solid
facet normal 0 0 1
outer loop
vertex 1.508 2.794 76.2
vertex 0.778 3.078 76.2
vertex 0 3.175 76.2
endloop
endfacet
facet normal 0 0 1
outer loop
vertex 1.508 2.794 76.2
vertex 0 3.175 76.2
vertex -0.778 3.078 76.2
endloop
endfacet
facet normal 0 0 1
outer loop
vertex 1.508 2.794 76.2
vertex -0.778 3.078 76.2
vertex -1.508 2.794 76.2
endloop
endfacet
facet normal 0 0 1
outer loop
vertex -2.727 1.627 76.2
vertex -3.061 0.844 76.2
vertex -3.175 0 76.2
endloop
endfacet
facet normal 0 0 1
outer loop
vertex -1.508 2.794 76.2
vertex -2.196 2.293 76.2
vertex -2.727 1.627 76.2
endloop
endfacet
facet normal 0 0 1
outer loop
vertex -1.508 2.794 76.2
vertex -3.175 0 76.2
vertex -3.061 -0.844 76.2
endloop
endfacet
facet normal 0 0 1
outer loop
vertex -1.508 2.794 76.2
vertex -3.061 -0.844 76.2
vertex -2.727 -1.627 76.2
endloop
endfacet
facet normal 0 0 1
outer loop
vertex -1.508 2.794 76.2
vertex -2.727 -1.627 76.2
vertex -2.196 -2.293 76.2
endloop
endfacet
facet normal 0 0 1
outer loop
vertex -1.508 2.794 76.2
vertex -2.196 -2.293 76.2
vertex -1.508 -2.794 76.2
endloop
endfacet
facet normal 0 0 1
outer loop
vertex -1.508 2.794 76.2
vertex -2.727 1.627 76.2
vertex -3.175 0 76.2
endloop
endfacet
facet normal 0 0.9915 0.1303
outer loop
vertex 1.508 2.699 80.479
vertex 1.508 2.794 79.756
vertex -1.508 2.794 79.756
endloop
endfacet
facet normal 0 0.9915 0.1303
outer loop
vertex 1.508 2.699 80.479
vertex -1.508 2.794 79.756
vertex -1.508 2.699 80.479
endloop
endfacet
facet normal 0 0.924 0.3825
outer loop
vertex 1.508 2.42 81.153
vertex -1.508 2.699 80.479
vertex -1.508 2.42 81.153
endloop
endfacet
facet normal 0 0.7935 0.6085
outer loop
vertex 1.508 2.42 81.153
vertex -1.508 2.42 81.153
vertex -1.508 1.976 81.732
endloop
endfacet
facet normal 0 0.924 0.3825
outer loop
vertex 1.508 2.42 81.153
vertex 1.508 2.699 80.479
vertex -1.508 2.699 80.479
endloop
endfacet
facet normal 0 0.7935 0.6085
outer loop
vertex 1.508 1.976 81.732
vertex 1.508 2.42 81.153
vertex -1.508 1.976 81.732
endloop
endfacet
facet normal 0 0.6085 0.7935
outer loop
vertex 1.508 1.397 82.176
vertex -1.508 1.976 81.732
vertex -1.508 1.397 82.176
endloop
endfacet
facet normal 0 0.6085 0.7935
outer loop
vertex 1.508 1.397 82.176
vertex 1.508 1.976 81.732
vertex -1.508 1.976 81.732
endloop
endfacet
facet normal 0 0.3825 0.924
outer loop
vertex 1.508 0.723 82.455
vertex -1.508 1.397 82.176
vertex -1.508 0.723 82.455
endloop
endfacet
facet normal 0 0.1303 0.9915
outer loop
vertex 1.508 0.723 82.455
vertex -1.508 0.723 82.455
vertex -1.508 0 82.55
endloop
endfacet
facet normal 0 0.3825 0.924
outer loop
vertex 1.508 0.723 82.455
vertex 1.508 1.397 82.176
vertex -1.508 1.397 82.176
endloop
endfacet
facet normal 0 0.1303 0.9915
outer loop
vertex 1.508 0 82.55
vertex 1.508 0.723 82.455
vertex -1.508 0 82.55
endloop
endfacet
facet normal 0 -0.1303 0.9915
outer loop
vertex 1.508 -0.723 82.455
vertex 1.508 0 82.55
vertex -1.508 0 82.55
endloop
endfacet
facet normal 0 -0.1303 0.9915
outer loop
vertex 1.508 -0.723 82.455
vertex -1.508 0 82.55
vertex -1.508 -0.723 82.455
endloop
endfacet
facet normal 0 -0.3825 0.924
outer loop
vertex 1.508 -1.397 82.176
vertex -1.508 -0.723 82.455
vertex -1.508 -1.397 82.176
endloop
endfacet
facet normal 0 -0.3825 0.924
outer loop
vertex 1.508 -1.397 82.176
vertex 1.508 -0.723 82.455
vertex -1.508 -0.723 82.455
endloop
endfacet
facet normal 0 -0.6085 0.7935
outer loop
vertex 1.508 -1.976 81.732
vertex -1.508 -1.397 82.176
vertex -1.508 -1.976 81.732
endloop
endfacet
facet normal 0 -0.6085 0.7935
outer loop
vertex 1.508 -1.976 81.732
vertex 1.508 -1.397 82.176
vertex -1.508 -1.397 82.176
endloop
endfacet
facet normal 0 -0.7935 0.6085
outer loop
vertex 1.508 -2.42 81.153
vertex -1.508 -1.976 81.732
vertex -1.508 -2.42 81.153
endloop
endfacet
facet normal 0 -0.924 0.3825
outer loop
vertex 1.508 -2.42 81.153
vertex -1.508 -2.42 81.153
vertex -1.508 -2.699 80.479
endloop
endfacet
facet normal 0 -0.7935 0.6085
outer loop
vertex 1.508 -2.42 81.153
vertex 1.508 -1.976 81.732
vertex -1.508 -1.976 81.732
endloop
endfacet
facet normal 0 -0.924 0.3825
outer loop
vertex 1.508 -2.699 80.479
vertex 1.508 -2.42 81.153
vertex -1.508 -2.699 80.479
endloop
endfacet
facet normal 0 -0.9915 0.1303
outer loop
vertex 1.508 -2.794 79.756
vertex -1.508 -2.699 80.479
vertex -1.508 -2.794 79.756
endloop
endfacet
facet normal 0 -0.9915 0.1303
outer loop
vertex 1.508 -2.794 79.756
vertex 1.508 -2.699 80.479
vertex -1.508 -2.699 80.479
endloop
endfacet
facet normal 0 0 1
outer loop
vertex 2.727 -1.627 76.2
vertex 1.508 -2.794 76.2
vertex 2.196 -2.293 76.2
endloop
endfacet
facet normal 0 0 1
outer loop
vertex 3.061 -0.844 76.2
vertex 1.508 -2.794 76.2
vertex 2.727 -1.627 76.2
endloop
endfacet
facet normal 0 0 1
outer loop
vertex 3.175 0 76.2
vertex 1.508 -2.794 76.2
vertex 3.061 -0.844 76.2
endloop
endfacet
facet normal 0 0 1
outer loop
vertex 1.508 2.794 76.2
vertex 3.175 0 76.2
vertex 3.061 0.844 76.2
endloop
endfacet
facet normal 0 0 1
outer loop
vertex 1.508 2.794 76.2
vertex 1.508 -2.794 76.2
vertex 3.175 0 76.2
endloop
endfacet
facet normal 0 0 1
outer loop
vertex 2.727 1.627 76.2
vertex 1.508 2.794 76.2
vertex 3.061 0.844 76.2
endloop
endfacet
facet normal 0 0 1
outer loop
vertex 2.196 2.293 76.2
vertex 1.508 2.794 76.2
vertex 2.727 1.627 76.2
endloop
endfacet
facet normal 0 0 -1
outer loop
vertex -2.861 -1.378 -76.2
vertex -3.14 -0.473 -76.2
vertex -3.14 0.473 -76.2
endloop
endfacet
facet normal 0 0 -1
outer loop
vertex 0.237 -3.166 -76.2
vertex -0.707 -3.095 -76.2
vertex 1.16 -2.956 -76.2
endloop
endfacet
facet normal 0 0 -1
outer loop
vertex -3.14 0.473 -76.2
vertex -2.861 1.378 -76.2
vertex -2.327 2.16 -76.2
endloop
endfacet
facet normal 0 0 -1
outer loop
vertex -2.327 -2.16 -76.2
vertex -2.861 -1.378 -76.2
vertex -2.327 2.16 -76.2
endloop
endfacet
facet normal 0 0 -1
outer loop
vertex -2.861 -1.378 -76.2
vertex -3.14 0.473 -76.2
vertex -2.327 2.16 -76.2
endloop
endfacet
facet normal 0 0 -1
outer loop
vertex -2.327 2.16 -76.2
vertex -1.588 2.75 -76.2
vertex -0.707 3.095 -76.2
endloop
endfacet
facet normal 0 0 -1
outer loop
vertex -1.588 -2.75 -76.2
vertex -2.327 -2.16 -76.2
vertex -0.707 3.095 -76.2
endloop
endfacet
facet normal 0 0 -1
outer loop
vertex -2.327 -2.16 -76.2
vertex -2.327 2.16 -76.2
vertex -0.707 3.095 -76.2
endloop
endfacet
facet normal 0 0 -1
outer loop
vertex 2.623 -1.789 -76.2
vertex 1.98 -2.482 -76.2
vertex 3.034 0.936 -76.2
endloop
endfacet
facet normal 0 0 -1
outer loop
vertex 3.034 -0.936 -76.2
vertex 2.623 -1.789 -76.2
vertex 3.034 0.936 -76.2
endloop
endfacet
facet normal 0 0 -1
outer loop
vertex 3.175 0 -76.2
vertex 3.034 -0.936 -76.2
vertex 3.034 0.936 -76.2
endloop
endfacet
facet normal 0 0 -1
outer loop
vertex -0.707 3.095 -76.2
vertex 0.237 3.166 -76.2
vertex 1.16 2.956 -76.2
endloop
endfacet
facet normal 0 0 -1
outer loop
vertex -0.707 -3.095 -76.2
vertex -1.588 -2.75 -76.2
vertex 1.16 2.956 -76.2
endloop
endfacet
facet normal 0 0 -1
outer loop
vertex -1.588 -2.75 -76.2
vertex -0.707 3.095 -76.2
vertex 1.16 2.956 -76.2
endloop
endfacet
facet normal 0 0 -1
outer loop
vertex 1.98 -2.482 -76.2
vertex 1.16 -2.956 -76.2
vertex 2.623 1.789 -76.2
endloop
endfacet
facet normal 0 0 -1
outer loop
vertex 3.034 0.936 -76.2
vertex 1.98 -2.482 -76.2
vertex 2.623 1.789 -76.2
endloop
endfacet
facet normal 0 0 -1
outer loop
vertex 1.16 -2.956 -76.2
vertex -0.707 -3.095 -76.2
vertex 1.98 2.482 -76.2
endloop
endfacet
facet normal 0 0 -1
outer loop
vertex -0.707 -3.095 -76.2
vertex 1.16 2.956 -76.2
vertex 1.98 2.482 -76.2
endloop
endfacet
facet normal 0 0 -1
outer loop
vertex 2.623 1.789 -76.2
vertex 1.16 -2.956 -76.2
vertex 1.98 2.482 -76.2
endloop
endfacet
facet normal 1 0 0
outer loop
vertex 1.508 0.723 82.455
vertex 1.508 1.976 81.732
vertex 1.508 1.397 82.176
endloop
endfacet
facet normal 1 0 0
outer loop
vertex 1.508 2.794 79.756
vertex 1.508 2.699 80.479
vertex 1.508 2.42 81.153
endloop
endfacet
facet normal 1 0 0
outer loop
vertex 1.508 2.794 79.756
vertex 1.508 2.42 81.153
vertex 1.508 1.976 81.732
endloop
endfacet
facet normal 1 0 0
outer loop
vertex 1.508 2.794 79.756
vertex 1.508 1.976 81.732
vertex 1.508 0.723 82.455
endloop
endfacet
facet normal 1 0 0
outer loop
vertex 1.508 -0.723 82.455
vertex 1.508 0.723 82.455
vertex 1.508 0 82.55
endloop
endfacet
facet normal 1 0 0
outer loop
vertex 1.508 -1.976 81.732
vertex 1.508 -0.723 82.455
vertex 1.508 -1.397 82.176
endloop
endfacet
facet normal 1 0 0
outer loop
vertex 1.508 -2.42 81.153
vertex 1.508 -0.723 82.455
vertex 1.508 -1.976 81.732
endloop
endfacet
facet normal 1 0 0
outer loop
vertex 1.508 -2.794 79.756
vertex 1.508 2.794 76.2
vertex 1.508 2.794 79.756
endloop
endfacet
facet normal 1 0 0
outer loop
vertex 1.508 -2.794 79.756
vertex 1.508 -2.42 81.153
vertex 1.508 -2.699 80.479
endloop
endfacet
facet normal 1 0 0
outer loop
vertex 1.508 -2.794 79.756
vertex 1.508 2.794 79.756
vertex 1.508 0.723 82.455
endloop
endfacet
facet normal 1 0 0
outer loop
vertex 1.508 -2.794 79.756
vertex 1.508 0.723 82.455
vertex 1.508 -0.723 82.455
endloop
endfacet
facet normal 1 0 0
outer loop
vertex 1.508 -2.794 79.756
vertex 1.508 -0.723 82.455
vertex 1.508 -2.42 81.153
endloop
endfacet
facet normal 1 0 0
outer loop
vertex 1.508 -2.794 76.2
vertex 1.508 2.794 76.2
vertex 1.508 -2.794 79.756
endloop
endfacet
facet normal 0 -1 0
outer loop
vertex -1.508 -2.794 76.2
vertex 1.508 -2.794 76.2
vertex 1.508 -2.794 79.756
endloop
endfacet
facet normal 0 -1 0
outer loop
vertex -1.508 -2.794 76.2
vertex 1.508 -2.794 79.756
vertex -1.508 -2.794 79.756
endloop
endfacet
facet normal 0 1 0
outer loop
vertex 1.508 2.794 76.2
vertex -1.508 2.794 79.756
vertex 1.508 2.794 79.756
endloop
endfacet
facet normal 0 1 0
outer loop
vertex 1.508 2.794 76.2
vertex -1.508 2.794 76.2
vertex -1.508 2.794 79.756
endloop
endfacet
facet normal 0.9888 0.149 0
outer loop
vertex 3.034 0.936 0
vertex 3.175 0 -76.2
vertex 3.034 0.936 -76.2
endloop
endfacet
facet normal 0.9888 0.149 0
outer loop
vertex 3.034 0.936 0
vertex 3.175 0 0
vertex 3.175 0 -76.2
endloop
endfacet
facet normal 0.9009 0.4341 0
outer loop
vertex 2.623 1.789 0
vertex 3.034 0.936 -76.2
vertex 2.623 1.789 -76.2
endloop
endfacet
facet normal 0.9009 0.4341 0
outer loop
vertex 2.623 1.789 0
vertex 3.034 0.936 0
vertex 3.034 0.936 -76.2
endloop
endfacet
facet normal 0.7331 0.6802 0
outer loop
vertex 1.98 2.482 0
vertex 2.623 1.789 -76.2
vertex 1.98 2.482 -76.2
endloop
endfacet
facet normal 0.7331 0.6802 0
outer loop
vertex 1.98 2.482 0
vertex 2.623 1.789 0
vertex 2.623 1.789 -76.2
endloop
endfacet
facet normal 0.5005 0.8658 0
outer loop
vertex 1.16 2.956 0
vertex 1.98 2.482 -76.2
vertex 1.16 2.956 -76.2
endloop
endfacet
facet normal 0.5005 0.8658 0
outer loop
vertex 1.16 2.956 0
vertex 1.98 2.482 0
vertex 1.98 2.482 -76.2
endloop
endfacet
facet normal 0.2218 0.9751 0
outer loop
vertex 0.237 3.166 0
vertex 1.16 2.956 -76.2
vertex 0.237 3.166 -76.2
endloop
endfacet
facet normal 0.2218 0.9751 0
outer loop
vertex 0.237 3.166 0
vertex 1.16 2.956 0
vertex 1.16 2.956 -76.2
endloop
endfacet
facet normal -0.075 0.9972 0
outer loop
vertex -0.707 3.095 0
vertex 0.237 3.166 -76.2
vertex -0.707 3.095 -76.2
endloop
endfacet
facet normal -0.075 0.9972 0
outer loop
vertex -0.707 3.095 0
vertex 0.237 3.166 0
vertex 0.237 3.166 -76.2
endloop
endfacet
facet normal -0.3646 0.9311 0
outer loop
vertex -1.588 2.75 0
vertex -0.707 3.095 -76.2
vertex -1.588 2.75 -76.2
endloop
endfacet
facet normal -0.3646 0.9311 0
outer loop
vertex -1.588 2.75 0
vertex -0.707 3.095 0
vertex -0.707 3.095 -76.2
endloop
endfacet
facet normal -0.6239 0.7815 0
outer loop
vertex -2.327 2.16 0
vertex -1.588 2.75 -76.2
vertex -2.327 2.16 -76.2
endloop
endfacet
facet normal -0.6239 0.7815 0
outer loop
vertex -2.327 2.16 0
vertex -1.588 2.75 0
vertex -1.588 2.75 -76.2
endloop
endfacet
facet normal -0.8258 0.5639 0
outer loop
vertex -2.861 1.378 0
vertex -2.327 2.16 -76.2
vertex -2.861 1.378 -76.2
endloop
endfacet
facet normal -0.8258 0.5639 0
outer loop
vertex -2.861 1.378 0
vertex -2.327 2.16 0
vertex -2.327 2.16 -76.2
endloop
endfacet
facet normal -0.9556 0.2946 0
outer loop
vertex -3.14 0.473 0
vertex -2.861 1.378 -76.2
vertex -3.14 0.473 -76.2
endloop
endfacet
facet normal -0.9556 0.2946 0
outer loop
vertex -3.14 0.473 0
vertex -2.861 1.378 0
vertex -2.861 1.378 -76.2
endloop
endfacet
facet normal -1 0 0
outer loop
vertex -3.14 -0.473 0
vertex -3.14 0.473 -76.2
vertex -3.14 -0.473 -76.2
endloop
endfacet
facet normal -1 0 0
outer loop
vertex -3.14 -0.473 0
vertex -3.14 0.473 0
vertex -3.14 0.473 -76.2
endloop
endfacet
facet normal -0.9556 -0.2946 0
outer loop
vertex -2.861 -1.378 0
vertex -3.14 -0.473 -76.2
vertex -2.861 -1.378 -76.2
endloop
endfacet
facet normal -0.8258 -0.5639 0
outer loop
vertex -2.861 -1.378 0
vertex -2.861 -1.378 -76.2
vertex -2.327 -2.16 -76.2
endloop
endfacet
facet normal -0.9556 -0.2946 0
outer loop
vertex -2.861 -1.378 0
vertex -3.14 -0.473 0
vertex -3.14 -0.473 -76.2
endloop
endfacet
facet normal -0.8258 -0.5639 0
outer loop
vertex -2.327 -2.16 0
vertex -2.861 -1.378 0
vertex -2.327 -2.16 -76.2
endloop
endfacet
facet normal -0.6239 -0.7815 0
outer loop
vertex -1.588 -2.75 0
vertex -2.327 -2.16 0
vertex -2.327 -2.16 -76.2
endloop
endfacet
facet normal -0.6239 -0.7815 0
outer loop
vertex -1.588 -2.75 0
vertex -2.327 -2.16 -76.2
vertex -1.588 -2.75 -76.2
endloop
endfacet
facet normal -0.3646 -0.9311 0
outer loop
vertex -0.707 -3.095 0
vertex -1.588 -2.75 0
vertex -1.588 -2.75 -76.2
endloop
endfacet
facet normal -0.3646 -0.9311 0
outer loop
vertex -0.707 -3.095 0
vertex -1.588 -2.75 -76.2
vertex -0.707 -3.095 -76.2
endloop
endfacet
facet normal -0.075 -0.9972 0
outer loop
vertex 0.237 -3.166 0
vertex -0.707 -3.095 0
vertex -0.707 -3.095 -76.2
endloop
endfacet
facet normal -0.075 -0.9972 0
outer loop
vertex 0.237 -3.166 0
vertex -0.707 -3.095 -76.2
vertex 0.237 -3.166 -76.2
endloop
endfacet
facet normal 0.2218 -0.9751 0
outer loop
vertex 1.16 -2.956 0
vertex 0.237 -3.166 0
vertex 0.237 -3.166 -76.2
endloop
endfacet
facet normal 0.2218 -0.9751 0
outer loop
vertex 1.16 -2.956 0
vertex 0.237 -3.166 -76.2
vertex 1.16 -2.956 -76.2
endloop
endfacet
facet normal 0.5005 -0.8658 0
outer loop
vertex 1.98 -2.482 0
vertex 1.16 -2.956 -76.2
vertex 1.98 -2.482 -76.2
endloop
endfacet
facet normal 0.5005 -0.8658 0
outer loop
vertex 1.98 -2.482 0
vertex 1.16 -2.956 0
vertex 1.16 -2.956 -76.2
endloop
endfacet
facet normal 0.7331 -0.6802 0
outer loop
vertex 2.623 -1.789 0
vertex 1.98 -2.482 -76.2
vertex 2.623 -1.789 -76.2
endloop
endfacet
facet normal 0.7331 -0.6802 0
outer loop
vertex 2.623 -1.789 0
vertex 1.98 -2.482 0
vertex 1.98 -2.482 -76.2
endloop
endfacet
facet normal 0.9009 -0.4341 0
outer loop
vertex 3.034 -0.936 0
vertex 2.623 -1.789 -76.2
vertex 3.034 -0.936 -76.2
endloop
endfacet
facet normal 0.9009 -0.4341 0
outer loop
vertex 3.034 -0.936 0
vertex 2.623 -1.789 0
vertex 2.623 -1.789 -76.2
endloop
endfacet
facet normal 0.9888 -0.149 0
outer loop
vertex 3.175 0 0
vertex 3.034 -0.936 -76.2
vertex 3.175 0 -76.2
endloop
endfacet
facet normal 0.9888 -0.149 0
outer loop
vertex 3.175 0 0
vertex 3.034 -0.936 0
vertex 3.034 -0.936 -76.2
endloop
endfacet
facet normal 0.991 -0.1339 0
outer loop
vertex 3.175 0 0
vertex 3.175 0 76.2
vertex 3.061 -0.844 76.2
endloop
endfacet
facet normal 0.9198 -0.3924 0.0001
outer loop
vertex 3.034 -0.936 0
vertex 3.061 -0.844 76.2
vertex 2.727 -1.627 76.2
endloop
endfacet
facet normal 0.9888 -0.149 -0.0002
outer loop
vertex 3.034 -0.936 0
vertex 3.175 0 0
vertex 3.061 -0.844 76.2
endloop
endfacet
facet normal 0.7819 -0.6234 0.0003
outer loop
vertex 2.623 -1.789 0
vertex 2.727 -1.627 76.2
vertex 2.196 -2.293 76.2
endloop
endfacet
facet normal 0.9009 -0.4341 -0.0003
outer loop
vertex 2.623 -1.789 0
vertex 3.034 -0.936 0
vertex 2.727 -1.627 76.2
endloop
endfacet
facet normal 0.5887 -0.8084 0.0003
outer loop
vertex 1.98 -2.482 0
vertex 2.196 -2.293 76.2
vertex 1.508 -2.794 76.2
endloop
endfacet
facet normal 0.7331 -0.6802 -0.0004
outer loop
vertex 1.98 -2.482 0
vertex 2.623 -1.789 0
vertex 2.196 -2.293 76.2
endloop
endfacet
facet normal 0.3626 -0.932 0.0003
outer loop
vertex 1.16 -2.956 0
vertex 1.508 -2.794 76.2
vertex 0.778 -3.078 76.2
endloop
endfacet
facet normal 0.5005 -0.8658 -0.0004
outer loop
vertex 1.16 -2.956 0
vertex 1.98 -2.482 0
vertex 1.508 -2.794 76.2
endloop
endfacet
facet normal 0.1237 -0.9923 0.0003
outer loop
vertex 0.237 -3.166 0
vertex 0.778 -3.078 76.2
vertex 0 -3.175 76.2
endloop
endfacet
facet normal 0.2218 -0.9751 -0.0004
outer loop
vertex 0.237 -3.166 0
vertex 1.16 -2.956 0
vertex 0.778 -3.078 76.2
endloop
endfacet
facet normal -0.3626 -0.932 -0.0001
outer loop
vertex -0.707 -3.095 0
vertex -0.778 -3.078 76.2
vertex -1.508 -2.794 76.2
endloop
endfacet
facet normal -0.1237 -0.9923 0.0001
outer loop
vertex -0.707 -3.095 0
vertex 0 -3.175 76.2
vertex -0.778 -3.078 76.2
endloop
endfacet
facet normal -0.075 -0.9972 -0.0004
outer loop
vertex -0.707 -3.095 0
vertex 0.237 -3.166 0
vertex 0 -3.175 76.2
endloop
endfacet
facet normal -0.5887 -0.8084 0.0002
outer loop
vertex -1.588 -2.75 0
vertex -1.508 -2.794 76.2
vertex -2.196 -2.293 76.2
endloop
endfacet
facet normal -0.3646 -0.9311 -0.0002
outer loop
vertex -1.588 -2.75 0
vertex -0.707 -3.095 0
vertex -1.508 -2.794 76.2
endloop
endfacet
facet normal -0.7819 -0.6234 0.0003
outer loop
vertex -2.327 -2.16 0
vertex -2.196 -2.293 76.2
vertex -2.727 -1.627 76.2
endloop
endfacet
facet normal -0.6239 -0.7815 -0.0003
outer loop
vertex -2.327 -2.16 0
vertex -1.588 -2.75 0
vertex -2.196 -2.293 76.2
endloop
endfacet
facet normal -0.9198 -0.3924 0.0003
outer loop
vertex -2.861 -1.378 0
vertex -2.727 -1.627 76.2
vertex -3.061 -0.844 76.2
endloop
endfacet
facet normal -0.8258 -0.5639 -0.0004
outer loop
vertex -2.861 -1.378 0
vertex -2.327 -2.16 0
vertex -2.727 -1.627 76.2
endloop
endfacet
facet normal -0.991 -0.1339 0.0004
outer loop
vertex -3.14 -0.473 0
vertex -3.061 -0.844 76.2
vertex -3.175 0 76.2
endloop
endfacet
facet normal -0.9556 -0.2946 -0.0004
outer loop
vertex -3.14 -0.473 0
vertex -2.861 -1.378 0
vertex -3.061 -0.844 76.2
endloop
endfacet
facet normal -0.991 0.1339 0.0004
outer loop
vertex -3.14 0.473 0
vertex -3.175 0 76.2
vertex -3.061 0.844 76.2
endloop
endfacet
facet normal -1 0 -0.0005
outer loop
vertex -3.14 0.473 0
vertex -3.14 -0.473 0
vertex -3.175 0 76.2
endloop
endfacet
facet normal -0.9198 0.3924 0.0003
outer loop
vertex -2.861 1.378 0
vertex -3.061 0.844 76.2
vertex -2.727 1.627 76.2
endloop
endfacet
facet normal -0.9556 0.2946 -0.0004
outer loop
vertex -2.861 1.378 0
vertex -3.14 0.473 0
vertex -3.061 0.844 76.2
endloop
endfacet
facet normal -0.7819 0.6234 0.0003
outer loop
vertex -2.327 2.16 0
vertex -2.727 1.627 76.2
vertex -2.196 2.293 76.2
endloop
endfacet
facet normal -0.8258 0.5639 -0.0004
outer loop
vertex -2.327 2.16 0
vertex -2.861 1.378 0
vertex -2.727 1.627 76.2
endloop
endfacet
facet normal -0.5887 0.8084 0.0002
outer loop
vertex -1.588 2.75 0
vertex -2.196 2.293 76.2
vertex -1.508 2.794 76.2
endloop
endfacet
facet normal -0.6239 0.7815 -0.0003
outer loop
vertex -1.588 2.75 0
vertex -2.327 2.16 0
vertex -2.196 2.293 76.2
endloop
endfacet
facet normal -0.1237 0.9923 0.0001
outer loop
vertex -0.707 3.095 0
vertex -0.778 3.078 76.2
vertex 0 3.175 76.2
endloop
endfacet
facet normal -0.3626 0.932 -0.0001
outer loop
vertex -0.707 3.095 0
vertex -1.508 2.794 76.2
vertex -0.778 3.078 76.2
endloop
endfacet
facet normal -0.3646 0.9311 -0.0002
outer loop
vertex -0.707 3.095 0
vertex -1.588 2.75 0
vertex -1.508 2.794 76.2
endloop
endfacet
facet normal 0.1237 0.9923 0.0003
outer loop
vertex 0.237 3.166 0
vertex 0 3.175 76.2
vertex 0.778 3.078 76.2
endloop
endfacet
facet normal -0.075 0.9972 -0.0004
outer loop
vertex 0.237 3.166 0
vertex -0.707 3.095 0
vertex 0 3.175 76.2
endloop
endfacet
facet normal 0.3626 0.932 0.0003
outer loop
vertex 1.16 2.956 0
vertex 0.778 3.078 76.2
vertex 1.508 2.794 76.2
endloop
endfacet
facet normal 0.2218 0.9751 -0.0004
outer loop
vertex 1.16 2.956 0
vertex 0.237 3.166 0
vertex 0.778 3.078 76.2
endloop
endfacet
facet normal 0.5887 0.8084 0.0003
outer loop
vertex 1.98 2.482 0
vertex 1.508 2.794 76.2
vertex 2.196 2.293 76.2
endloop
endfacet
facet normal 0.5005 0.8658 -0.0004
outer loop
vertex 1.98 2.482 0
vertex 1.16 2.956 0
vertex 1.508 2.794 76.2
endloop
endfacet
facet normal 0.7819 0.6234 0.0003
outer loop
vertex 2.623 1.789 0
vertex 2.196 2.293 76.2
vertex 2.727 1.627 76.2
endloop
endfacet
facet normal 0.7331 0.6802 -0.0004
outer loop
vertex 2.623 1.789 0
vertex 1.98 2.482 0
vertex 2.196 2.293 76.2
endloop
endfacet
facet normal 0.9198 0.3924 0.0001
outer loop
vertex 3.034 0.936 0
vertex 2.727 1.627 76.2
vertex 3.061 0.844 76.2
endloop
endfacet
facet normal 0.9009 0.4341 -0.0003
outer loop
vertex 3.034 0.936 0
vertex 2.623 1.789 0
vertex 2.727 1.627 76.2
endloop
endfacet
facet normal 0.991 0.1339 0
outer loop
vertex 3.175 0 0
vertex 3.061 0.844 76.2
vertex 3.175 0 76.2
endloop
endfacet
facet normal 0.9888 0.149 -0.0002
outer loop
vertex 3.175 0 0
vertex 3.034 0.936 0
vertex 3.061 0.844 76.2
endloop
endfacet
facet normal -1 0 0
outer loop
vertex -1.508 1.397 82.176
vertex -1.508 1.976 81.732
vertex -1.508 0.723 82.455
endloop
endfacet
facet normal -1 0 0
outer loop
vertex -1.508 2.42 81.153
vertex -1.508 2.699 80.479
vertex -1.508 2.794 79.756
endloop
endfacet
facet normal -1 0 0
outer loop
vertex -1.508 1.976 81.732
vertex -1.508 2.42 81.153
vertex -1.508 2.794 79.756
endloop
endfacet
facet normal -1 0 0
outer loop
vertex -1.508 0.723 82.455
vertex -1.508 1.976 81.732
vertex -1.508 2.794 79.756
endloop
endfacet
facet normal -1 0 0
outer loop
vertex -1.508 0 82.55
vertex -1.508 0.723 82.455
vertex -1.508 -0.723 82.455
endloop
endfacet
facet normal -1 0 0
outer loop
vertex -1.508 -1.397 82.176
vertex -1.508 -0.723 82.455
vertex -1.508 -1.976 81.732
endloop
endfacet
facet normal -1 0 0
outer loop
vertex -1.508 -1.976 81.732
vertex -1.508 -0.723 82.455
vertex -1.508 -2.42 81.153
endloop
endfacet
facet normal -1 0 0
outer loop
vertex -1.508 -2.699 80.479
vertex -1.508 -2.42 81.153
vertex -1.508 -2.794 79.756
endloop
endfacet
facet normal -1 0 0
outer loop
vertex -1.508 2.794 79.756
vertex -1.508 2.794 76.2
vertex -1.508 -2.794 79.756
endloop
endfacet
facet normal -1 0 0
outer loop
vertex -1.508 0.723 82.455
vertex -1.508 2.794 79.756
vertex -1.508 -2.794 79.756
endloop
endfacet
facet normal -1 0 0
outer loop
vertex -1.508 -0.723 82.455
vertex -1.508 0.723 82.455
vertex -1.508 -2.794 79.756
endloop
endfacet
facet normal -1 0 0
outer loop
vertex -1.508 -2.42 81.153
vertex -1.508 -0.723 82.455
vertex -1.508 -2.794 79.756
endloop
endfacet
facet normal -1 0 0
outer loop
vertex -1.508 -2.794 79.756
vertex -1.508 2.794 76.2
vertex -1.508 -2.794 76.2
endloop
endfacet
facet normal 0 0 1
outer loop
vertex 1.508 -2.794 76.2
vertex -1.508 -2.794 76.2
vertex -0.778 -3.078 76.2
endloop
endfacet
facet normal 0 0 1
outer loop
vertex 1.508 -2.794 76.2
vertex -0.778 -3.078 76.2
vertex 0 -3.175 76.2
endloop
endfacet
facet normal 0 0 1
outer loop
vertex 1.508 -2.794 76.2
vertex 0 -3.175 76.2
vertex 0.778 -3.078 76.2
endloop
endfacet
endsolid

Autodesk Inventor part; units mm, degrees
ref_plane "YZ Plane" through (0, 0, 0) normal (1, 0, 0) x (0, 1, 0)
ref_plane "XZ Plane" through (0, 0, 0) normal (0, 1, 0) x (-1, 0, 0)
ref_plane "XY Plane" through (0, 0, 0) normal (0, 0, 1) x (1, 0, 0)
sketch "Sketch1" plane through (0, 0, 0) normal (0, 0, 1) x (1, 0, 0)
  circle A0 centre (0, 0) radius 3.175
  dimension "d0" = 6.35
extrude "Extrusion1" add sketch "Sketch1" along normal mid plane 152.4
sketch "Sketch2" plane through (0, 0, 76.2) normal (0, 0, 1) x (1, 0, 0)
  circle A0 centre (0, 0) radius 3.175 projected
  line L0 (-1.508, 2.794) -> (-1.508, -2.794)
  line L1 (1.508, 2.794) -> (1.508, -2.794)
  line L2 (1.508, -2.794) -> (-1.508, -2.794)
  line L3 (-1.508, 2.794) -> (1.508, 2.794)
  dimension "d3" = 5.588
extrude "Extrusion2" add sketch "Sketch2" along normal blind 6.35 contours L1 L2 L0 L3
sketch "Sketch3" plane through (1.508, -2.794, 76.2) normal (1, 0, 0) x (0, 0, -1)
  line L0 (-6.35, 5.588) -> (-6.35, 0) projected
  line L1 (0, 0) -> (-6.35, 0) projected
  line L2 (0, 5.588) -> (0, 0) projected
  line L3 (0, 5.588) -> (-6.35, 5.588) projected
  arc A0 (-3.556, 5.588) -> (-3.556, 0) centre (-3.556, 2.794) ccw
  point P0 (76.2, 2.794)
extrude "Extrusion3" cut sketch "Sketch3" against normal blind 6.35 contours L3 A0 L0 | A0 L1 L0
properties part number "piston core"
